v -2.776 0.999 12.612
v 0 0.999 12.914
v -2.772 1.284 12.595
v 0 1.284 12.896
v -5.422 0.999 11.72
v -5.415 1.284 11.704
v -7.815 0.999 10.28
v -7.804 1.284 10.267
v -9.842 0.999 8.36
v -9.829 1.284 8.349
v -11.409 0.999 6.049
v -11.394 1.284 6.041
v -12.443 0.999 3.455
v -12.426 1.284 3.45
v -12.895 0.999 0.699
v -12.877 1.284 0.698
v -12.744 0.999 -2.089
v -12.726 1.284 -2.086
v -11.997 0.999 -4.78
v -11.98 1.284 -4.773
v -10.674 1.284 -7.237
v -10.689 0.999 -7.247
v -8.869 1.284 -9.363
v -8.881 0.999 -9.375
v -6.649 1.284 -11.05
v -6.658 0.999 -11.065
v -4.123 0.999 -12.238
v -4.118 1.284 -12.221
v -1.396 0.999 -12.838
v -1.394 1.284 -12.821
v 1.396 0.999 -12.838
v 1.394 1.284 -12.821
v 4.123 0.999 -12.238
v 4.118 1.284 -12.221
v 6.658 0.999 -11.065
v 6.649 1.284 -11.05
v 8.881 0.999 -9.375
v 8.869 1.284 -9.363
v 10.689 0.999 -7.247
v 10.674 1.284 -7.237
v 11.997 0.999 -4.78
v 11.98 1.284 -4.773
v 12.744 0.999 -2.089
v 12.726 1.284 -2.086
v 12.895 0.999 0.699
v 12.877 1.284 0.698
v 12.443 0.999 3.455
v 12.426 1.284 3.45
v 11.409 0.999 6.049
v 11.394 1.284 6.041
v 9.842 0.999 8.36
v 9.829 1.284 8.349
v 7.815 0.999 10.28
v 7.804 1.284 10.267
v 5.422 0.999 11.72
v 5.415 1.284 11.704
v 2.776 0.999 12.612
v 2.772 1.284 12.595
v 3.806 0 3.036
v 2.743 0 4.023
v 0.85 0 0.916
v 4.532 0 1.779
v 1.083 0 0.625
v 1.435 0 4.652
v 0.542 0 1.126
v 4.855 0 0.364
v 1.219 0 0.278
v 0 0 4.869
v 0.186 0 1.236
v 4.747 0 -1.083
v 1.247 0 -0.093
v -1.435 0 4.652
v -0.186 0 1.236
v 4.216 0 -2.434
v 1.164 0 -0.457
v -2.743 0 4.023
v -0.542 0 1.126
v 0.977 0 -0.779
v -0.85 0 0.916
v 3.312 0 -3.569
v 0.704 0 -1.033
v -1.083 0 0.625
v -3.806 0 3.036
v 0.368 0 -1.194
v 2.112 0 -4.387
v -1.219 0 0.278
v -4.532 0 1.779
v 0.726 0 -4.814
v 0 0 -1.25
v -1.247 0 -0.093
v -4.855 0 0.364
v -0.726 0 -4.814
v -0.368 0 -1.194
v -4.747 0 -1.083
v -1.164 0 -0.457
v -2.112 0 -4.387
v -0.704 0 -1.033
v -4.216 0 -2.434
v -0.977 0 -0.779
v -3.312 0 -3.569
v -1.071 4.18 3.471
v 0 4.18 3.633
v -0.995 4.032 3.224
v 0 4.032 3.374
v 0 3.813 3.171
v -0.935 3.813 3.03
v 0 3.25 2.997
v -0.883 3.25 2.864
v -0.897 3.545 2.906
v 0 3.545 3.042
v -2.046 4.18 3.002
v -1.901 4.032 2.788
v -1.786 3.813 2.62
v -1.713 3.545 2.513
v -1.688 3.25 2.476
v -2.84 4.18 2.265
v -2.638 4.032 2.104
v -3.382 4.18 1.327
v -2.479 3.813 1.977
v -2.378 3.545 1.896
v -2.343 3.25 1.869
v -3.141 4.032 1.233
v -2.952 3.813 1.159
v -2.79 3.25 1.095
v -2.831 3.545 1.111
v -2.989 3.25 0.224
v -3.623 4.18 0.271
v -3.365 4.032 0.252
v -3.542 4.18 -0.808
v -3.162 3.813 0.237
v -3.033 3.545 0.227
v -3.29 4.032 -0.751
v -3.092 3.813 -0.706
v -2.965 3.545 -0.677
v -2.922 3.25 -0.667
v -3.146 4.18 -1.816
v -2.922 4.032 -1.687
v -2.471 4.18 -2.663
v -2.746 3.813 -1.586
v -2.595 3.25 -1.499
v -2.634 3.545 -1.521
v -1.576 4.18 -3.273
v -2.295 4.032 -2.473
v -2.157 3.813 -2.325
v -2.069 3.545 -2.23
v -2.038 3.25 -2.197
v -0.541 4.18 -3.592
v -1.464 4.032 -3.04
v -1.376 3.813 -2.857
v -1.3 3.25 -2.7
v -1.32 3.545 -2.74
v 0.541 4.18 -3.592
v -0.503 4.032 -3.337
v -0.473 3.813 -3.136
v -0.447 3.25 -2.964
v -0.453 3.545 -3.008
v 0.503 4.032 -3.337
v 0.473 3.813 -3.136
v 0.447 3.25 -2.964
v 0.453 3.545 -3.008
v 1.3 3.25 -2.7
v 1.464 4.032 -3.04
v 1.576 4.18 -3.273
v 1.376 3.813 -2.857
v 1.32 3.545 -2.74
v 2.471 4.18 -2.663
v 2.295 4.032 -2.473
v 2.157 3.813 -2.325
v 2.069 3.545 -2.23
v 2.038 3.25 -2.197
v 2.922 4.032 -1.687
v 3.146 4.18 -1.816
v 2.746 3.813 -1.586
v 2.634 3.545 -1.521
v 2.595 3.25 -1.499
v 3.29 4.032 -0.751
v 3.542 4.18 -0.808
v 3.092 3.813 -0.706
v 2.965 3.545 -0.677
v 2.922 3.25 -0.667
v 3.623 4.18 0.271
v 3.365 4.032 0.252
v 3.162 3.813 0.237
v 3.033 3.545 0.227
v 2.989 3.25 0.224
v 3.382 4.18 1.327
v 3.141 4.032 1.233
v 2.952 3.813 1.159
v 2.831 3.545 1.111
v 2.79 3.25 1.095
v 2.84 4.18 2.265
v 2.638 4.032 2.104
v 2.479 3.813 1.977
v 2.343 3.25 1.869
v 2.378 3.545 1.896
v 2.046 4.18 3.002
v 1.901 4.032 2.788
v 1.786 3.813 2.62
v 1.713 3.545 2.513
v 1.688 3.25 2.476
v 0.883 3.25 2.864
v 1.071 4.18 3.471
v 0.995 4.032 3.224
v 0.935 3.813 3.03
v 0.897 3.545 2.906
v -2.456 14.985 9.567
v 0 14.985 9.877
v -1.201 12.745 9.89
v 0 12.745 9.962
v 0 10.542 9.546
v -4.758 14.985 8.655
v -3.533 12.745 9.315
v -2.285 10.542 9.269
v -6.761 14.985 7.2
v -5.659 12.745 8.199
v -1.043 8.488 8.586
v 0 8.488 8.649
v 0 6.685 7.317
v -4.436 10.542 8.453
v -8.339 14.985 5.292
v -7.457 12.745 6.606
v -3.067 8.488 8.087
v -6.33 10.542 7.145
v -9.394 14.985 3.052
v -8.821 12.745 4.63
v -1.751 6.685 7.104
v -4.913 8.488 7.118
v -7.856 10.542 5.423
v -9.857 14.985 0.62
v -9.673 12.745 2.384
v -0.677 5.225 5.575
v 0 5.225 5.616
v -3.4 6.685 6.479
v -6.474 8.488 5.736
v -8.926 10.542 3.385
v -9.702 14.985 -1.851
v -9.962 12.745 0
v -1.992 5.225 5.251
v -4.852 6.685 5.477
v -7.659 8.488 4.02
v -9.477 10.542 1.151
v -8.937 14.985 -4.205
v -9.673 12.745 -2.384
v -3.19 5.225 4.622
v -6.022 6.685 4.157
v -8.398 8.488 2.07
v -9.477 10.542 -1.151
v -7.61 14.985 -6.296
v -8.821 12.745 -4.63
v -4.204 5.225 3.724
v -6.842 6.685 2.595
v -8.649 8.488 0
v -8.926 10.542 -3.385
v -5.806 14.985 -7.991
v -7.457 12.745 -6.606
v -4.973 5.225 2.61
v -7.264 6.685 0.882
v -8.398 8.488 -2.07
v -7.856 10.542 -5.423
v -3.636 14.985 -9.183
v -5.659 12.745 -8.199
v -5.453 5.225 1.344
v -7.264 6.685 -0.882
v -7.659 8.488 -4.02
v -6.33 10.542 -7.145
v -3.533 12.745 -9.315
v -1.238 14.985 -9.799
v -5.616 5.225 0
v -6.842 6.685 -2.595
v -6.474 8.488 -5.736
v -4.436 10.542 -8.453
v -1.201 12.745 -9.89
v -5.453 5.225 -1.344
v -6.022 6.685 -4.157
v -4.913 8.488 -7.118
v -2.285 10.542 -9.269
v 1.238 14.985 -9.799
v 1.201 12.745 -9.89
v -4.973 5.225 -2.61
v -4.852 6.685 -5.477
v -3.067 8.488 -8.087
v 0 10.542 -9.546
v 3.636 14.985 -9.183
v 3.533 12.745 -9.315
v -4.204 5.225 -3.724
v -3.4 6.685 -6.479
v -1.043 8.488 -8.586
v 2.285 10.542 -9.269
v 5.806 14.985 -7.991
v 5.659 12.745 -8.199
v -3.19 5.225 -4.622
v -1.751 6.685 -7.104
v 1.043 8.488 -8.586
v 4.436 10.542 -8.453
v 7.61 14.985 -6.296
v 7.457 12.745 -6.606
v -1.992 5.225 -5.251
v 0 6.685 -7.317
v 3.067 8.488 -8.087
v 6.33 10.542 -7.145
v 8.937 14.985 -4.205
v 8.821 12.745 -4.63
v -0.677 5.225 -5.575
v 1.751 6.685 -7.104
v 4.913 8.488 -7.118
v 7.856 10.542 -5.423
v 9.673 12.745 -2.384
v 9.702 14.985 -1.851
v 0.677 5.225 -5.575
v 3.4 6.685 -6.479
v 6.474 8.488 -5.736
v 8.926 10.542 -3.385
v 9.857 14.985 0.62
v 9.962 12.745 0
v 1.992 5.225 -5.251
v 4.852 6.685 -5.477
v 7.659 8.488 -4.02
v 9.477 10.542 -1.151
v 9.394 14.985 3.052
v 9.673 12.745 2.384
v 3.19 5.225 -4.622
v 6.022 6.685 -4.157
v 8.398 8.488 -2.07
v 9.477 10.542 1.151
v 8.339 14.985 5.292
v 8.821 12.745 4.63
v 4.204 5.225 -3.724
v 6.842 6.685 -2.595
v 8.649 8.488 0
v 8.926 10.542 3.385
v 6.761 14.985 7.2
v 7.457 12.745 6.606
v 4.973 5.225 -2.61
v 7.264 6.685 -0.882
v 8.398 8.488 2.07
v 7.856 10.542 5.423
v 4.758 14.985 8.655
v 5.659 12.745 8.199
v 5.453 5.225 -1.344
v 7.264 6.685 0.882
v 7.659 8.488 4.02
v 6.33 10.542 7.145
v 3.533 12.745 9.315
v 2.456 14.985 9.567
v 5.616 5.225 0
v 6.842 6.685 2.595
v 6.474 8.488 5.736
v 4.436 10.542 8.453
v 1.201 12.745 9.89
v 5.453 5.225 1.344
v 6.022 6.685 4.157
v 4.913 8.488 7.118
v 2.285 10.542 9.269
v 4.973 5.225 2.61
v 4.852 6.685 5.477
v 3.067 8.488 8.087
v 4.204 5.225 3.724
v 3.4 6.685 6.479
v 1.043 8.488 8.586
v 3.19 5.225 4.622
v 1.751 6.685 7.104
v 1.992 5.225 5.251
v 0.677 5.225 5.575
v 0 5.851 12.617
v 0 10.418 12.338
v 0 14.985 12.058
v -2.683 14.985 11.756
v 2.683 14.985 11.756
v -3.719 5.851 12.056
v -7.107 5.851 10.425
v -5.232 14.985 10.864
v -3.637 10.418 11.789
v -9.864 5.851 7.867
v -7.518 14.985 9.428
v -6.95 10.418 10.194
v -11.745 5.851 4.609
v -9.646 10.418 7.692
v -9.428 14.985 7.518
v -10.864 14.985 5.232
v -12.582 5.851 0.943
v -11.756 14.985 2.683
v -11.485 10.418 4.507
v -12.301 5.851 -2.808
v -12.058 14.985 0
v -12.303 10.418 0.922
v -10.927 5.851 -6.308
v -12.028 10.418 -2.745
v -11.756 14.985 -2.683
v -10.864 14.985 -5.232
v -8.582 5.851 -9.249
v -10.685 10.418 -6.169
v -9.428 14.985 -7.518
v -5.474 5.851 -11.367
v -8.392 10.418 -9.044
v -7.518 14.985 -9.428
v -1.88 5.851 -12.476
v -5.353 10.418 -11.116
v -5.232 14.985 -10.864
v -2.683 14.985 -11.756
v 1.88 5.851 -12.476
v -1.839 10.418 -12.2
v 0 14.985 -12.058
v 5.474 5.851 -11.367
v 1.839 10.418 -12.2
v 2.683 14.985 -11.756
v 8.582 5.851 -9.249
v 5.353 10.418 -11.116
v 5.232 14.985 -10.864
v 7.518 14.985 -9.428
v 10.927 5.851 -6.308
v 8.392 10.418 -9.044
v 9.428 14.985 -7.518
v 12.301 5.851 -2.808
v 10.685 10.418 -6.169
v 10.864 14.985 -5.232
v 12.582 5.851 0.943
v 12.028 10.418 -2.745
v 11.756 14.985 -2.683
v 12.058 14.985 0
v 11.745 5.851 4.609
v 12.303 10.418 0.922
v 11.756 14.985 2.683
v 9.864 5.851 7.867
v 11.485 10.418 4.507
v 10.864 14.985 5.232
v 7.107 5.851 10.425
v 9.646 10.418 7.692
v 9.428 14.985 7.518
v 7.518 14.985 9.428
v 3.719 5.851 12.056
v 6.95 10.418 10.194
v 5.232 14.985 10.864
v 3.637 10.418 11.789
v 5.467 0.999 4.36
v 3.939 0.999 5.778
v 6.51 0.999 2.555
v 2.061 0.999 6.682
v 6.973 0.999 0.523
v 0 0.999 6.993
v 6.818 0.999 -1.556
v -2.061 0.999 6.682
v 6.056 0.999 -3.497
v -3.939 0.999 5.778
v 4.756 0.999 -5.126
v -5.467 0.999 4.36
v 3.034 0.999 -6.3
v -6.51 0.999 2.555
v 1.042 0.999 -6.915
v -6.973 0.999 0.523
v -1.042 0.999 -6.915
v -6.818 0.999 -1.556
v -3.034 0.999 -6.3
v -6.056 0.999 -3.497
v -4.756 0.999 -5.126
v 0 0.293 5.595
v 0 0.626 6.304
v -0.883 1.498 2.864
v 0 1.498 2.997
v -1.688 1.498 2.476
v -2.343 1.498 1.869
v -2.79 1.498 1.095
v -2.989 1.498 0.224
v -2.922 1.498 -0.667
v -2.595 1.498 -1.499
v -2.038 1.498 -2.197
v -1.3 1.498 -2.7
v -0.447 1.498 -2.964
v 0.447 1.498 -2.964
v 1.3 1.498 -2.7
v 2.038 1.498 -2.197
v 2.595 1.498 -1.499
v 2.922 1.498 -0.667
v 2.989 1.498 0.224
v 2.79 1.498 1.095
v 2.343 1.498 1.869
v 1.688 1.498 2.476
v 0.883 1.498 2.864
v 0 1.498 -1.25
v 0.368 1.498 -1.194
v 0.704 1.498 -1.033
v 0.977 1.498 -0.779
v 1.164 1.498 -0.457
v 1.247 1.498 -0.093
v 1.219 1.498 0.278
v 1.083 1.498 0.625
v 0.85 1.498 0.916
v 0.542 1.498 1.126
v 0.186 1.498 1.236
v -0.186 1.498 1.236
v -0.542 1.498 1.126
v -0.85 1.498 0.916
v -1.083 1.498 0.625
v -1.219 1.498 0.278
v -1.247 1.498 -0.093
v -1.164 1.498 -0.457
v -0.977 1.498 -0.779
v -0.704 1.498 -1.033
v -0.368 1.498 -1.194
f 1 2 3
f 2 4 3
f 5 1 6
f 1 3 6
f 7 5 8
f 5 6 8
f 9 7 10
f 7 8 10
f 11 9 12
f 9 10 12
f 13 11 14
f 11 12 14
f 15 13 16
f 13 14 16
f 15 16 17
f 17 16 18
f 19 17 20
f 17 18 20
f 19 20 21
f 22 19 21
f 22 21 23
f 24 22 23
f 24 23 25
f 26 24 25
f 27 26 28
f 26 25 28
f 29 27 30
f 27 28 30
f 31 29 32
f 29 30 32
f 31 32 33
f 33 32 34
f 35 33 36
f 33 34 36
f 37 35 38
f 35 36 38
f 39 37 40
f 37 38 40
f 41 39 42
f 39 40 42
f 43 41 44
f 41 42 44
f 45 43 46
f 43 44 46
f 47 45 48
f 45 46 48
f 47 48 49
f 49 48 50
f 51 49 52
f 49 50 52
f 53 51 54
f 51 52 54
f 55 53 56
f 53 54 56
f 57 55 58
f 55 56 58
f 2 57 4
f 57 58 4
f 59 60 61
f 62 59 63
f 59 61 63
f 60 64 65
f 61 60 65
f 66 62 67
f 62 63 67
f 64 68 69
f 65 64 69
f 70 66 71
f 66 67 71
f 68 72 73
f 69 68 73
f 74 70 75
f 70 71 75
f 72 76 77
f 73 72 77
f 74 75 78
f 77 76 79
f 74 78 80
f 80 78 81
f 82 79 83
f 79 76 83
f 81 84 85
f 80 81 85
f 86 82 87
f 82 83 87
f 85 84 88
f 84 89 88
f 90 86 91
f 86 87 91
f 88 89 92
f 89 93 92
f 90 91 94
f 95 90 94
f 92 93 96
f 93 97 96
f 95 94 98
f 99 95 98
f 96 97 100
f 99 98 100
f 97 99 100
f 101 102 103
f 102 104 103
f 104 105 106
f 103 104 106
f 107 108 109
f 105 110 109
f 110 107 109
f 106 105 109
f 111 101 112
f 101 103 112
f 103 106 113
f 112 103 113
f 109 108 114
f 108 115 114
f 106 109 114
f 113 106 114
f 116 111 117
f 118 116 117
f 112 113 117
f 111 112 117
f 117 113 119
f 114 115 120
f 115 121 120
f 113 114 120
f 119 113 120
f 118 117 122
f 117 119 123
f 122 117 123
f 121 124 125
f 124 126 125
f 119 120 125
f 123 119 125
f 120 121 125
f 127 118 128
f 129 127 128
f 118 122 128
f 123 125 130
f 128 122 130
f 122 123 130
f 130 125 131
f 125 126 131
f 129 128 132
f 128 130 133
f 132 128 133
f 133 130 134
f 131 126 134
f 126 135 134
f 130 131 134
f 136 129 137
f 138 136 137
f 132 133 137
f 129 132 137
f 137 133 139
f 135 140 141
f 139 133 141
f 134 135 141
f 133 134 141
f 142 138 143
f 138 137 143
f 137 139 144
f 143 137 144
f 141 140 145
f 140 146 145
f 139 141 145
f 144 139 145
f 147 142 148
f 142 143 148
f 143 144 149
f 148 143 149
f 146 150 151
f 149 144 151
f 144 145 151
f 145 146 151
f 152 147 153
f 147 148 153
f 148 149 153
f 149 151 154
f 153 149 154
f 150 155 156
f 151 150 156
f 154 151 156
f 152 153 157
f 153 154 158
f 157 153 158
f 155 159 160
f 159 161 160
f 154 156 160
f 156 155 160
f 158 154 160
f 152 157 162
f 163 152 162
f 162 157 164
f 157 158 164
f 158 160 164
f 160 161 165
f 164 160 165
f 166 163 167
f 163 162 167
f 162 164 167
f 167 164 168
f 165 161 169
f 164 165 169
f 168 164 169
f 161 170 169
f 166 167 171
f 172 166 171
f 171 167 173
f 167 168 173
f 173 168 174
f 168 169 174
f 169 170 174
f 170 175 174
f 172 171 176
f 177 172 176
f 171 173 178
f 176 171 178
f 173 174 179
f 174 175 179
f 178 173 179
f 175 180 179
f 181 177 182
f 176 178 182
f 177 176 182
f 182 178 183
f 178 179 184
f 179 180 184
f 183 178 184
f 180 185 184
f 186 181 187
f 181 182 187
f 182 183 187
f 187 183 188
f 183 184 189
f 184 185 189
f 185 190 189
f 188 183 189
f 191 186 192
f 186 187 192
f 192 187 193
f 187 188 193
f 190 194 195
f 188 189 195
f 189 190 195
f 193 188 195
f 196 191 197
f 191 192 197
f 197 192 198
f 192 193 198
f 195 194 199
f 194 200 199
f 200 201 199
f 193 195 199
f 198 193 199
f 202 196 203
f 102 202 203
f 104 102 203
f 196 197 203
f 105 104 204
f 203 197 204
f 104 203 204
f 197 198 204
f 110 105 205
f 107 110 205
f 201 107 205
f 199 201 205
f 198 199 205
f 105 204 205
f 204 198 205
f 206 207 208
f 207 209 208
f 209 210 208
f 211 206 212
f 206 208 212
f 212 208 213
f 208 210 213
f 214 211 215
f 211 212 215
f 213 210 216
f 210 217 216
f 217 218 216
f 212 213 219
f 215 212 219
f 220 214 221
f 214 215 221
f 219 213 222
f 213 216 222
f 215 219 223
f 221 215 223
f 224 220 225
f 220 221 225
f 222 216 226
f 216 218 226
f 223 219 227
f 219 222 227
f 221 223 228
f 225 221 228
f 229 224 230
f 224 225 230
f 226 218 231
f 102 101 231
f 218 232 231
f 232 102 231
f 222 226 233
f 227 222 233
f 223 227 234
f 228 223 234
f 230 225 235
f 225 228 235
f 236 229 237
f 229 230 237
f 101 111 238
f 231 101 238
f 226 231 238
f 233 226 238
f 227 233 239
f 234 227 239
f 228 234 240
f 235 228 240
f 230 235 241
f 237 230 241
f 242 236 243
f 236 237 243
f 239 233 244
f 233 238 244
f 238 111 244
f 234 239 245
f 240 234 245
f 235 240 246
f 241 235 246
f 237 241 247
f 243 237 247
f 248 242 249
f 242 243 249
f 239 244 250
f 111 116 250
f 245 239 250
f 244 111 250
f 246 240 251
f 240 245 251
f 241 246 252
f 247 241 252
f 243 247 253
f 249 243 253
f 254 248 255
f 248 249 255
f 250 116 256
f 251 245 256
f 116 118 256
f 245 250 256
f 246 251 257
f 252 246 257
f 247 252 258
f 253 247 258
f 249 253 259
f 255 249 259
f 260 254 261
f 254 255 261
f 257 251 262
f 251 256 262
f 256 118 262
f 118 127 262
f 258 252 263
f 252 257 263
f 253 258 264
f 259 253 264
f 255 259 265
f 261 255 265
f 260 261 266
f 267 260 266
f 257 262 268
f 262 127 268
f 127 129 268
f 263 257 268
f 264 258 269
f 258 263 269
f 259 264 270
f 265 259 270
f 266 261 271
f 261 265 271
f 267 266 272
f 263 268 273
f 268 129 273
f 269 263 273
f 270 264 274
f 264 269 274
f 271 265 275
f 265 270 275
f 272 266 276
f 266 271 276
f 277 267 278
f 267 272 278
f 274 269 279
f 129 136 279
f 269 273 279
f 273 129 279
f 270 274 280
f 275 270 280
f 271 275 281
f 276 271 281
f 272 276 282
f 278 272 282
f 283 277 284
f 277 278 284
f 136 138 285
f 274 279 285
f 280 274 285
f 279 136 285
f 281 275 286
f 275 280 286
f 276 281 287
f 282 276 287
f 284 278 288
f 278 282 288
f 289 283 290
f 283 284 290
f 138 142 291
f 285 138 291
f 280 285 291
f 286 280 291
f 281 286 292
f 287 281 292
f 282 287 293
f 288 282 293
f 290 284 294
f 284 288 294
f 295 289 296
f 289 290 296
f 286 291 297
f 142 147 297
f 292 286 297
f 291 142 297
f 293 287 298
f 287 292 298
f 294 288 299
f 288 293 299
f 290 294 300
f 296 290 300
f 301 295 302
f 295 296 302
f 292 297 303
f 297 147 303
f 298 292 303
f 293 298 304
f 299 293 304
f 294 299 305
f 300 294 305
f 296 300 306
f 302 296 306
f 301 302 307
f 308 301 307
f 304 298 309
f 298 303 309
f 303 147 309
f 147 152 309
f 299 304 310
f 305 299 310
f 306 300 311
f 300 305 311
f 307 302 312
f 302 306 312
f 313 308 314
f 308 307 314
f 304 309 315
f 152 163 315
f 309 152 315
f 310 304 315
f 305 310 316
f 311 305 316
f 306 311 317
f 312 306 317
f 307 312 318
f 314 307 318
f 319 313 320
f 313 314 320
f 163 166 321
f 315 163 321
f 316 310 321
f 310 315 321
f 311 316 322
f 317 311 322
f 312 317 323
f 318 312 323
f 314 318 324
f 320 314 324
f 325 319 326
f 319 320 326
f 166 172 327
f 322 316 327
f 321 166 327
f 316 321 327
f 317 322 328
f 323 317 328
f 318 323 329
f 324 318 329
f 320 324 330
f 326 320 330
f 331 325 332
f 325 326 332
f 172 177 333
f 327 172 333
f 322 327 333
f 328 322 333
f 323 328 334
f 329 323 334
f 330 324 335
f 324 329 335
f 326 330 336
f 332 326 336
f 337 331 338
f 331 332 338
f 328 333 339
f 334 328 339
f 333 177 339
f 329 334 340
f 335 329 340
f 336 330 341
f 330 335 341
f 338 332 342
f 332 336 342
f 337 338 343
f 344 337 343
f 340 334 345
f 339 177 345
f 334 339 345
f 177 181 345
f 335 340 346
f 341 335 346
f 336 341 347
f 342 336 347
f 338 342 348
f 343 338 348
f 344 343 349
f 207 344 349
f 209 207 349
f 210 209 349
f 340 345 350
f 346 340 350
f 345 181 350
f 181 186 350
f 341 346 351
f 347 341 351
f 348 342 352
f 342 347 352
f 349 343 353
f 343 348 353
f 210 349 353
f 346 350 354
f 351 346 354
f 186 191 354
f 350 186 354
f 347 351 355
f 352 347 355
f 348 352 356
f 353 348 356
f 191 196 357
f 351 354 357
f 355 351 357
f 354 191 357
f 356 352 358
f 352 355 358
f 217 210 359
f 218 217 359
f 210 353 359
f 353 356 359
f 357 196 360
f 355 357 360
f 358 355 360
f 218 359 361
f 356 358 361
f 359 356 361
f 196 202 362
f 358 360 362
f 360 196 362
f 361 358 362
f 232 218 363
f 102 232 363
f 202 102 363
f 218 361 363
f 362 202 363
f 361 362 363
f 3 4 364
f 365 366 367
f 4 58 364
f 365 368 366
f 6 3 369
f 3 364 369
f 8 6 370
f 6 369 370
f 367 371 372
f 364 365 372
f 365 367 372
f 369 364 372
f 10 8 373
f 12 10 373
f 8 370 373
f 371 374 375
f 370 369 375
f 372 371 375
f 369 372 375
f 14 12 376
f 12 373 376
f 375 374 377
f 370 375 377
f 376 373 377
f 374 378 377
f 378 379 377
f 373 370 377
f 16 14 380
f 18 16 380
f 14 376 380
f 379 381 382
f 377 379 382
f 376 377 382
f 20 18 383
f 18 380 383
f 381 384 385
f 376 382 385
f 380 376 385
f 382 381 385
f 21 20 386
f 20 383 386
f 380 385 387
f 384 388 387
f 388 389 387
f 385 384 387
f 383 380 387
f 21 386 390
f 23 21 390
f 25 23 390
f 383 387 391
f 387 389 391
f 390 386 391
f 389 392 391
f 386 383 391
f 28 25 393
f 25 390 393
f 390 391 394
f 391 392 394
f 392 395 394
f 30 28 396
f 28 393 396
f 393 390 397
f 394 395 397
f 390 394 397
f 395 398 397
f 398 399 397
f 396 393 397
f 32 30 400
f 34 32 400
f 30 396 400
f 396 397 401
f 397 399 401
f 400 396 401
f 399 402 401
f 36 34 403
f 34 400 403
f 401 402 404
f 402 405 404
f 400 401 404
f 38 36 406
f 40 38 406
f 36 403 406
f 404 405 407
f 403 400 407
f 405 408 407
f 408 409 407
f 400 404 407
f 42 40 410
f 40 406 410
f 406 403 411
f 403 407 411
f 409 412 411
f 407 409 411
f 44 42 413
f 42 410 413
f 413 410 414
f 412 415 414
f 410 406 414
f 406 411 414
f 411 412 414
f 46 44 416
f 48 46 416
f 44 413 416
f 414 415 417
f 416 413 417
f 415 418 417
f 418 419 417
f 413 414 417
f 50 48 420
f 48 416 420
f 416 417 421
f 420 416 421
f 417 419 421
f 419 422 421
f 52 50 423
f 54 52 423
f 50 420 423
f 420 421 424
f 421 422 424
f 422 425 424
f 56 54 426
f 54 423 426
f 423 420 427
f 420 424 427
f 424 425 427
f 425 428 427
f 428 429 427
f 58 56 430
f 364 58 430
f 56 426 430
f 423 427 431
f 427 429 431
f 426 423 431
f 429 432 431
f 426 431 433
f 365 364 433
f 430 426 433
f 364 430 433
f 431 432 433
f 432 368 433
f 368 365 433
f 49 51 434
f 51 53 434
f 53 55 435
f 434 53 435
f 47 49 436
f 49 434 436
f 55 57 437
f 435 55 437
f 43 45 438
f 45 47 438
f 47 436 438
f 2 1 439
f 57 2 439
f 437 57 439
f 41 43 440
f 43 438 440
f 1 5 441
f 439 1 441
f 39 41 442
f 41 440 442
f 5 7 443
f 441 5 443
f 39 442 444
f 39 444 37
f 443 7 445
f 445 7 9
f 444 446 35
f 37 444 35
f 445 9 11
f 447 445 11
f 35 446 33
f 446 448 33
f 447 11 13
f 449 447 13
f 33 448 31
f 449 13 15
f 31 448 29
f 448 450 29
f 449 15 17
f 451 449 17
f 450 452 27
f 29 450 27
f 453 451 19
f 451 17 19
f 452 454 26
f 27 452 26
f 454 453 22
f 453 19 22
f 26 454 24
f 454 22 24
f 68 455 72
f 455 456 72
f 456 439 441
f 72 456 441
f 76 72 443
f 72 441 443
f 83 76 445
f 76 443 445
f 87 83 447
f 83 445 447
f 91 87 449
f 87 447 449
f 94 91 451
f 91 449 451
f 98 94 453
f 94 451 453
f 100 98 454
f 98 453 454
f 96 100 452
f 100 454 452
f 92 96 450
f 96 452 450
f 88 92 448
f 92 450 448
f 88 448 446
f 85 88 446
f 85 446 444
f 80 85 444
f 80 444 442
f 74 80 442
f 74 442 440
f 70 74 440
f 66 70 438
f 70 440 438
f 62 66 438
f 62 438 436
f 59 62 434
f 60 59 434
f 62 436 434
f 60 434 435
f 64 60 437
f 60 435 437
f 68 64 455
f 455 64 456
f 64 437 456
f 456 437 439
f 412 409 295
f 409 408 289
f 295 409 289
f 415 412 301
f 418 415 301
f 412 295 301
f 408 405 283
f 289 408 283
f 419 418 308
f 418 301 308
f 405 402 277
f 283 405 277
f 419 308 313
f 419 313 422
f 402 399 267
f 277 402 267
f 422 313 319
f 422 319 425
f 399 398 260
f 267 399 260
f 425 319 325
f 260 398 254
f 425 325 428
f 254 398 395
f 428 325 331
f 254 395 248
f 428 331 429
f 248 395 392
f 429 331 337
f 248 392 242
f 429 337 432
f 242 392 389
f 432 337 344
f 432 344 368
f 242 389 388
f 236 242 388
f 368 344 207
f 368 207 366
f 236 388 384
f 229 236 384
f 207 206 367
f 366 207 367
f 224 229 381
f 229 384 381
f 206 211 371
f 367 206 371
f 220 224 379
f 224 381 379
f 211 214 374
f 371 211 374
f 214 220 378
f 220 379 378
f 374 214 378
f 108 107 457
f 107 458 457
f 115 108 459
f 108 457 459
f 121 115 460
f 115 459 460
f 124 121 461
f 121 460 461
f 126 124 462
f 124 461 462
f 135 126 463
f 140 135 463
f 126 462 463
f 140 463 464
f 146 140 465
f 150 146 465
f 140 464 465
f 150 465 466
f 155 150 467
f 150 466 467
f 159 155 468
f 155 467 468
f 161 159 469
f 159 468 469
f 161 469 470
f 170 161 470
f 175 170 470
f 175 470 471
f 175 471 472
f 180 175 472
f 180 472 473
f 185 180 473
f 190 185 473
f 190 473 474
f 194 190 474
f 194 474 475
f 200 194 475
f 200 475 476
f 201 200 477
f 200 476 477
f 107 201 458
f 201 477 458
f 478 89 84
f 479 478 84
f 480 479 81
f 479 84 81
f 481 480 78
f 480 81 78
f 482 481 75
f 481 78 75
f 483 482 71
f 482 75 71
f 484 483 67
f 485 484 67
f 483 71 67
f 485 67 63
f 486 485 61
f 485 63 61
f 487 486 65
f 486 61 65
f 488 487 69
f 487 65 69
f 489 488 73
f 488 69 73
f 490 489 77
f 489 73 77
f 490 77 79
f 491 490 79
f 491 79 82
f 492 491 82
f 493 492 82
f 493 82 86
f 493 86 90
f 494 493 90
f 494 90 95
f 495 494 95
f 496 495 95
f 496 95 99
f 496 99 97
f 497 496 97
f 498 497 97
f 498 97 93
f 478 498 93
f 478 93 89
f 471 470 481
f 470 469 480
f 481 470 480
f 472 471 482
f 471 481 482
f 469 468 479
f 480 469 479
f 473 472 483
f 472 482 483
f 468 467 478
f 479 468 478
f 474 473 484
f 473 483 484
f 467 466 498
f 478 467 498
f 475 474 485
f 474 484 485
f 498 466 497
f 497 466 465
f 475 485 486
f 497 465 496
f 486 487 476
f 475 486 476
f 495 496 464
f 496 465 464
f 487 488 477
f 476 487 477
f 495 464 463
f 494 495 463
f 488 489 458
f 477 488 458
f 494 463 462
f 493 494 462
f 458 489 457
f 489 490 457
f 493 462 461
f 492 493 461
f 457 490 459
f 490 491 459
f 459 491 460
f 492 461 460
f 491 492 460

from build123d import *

# Parameters (mm, degrees)
IZIM2_R               = 1.25
KES_EKSTR_ZYON1_DEPTH = 10


with BuildPart() as part:
    # Çizim1 → Döndür3 (revolve)
    with BuildSketch(Plane(origin=(0, 0, 0), x_dir=(0, 0, -1), z_dir=(1, 0, 0)), mode=Mode.PRIVATE) as d_nd_r3_sk:
        with BuildLine():
            Line((0, 1.4985), (0, 0))
            Line((0, 0), (1.24875, 0))
            Line((1.24875, 0), (4.868655858, 0))
            ThreePointArc((4.868655858, 0), (5.951824945, 0.454850463), (6.993, 0.999))
            Line((6.993, 0.999), (11.838744981, 0.999))
            Line((11.838744981, 0.999), (12.913678251, 0.999))
            Line((12.913678251, 0.999), (12.896228404, 1.284302481))
            Line((12.896228404, 1.284302481), (12.058257846, 14.985))
            Line((12.058257846, 14.985), (9.876973107, 14.985))
            ThreePointArc((9.876973107, 14.985), (8.649440213, 8.487771762), (3.632727273, 4.180405623))
            ThreePointArc((3.632727273, 4.180405623), (3.171102899, 3.813308184), (2.997, 3.249796185))
            Line((2.997, 3.249796185), (2.997, 1.4985))
            Line((2.997, 1.4985), (1.24875, 1.4985))
            Line((1.24875, 1.4985), (0, 1.4985))
        make_face()
    revolve(d_nd_r3_sk.sketch.rotate(Axis((0, 1.4985, 0), (0, -1, 0)), 180), axis=Axis((0, 1.4985, 0), (0, -1, 0)))

    # Çizim2 → Kes-Ekstrüzyon1 (cut)
    with BuildSketch(Plane.XZ):
        with Locations(Location((0, 0, 0), (0, 0, 270))):
            Circle(IZIM2_R)
    extrude(amount=-KES_EKSTR_ZYON1_DEPTH, mode=Mode.SUBTRACT)


solid = part.part
